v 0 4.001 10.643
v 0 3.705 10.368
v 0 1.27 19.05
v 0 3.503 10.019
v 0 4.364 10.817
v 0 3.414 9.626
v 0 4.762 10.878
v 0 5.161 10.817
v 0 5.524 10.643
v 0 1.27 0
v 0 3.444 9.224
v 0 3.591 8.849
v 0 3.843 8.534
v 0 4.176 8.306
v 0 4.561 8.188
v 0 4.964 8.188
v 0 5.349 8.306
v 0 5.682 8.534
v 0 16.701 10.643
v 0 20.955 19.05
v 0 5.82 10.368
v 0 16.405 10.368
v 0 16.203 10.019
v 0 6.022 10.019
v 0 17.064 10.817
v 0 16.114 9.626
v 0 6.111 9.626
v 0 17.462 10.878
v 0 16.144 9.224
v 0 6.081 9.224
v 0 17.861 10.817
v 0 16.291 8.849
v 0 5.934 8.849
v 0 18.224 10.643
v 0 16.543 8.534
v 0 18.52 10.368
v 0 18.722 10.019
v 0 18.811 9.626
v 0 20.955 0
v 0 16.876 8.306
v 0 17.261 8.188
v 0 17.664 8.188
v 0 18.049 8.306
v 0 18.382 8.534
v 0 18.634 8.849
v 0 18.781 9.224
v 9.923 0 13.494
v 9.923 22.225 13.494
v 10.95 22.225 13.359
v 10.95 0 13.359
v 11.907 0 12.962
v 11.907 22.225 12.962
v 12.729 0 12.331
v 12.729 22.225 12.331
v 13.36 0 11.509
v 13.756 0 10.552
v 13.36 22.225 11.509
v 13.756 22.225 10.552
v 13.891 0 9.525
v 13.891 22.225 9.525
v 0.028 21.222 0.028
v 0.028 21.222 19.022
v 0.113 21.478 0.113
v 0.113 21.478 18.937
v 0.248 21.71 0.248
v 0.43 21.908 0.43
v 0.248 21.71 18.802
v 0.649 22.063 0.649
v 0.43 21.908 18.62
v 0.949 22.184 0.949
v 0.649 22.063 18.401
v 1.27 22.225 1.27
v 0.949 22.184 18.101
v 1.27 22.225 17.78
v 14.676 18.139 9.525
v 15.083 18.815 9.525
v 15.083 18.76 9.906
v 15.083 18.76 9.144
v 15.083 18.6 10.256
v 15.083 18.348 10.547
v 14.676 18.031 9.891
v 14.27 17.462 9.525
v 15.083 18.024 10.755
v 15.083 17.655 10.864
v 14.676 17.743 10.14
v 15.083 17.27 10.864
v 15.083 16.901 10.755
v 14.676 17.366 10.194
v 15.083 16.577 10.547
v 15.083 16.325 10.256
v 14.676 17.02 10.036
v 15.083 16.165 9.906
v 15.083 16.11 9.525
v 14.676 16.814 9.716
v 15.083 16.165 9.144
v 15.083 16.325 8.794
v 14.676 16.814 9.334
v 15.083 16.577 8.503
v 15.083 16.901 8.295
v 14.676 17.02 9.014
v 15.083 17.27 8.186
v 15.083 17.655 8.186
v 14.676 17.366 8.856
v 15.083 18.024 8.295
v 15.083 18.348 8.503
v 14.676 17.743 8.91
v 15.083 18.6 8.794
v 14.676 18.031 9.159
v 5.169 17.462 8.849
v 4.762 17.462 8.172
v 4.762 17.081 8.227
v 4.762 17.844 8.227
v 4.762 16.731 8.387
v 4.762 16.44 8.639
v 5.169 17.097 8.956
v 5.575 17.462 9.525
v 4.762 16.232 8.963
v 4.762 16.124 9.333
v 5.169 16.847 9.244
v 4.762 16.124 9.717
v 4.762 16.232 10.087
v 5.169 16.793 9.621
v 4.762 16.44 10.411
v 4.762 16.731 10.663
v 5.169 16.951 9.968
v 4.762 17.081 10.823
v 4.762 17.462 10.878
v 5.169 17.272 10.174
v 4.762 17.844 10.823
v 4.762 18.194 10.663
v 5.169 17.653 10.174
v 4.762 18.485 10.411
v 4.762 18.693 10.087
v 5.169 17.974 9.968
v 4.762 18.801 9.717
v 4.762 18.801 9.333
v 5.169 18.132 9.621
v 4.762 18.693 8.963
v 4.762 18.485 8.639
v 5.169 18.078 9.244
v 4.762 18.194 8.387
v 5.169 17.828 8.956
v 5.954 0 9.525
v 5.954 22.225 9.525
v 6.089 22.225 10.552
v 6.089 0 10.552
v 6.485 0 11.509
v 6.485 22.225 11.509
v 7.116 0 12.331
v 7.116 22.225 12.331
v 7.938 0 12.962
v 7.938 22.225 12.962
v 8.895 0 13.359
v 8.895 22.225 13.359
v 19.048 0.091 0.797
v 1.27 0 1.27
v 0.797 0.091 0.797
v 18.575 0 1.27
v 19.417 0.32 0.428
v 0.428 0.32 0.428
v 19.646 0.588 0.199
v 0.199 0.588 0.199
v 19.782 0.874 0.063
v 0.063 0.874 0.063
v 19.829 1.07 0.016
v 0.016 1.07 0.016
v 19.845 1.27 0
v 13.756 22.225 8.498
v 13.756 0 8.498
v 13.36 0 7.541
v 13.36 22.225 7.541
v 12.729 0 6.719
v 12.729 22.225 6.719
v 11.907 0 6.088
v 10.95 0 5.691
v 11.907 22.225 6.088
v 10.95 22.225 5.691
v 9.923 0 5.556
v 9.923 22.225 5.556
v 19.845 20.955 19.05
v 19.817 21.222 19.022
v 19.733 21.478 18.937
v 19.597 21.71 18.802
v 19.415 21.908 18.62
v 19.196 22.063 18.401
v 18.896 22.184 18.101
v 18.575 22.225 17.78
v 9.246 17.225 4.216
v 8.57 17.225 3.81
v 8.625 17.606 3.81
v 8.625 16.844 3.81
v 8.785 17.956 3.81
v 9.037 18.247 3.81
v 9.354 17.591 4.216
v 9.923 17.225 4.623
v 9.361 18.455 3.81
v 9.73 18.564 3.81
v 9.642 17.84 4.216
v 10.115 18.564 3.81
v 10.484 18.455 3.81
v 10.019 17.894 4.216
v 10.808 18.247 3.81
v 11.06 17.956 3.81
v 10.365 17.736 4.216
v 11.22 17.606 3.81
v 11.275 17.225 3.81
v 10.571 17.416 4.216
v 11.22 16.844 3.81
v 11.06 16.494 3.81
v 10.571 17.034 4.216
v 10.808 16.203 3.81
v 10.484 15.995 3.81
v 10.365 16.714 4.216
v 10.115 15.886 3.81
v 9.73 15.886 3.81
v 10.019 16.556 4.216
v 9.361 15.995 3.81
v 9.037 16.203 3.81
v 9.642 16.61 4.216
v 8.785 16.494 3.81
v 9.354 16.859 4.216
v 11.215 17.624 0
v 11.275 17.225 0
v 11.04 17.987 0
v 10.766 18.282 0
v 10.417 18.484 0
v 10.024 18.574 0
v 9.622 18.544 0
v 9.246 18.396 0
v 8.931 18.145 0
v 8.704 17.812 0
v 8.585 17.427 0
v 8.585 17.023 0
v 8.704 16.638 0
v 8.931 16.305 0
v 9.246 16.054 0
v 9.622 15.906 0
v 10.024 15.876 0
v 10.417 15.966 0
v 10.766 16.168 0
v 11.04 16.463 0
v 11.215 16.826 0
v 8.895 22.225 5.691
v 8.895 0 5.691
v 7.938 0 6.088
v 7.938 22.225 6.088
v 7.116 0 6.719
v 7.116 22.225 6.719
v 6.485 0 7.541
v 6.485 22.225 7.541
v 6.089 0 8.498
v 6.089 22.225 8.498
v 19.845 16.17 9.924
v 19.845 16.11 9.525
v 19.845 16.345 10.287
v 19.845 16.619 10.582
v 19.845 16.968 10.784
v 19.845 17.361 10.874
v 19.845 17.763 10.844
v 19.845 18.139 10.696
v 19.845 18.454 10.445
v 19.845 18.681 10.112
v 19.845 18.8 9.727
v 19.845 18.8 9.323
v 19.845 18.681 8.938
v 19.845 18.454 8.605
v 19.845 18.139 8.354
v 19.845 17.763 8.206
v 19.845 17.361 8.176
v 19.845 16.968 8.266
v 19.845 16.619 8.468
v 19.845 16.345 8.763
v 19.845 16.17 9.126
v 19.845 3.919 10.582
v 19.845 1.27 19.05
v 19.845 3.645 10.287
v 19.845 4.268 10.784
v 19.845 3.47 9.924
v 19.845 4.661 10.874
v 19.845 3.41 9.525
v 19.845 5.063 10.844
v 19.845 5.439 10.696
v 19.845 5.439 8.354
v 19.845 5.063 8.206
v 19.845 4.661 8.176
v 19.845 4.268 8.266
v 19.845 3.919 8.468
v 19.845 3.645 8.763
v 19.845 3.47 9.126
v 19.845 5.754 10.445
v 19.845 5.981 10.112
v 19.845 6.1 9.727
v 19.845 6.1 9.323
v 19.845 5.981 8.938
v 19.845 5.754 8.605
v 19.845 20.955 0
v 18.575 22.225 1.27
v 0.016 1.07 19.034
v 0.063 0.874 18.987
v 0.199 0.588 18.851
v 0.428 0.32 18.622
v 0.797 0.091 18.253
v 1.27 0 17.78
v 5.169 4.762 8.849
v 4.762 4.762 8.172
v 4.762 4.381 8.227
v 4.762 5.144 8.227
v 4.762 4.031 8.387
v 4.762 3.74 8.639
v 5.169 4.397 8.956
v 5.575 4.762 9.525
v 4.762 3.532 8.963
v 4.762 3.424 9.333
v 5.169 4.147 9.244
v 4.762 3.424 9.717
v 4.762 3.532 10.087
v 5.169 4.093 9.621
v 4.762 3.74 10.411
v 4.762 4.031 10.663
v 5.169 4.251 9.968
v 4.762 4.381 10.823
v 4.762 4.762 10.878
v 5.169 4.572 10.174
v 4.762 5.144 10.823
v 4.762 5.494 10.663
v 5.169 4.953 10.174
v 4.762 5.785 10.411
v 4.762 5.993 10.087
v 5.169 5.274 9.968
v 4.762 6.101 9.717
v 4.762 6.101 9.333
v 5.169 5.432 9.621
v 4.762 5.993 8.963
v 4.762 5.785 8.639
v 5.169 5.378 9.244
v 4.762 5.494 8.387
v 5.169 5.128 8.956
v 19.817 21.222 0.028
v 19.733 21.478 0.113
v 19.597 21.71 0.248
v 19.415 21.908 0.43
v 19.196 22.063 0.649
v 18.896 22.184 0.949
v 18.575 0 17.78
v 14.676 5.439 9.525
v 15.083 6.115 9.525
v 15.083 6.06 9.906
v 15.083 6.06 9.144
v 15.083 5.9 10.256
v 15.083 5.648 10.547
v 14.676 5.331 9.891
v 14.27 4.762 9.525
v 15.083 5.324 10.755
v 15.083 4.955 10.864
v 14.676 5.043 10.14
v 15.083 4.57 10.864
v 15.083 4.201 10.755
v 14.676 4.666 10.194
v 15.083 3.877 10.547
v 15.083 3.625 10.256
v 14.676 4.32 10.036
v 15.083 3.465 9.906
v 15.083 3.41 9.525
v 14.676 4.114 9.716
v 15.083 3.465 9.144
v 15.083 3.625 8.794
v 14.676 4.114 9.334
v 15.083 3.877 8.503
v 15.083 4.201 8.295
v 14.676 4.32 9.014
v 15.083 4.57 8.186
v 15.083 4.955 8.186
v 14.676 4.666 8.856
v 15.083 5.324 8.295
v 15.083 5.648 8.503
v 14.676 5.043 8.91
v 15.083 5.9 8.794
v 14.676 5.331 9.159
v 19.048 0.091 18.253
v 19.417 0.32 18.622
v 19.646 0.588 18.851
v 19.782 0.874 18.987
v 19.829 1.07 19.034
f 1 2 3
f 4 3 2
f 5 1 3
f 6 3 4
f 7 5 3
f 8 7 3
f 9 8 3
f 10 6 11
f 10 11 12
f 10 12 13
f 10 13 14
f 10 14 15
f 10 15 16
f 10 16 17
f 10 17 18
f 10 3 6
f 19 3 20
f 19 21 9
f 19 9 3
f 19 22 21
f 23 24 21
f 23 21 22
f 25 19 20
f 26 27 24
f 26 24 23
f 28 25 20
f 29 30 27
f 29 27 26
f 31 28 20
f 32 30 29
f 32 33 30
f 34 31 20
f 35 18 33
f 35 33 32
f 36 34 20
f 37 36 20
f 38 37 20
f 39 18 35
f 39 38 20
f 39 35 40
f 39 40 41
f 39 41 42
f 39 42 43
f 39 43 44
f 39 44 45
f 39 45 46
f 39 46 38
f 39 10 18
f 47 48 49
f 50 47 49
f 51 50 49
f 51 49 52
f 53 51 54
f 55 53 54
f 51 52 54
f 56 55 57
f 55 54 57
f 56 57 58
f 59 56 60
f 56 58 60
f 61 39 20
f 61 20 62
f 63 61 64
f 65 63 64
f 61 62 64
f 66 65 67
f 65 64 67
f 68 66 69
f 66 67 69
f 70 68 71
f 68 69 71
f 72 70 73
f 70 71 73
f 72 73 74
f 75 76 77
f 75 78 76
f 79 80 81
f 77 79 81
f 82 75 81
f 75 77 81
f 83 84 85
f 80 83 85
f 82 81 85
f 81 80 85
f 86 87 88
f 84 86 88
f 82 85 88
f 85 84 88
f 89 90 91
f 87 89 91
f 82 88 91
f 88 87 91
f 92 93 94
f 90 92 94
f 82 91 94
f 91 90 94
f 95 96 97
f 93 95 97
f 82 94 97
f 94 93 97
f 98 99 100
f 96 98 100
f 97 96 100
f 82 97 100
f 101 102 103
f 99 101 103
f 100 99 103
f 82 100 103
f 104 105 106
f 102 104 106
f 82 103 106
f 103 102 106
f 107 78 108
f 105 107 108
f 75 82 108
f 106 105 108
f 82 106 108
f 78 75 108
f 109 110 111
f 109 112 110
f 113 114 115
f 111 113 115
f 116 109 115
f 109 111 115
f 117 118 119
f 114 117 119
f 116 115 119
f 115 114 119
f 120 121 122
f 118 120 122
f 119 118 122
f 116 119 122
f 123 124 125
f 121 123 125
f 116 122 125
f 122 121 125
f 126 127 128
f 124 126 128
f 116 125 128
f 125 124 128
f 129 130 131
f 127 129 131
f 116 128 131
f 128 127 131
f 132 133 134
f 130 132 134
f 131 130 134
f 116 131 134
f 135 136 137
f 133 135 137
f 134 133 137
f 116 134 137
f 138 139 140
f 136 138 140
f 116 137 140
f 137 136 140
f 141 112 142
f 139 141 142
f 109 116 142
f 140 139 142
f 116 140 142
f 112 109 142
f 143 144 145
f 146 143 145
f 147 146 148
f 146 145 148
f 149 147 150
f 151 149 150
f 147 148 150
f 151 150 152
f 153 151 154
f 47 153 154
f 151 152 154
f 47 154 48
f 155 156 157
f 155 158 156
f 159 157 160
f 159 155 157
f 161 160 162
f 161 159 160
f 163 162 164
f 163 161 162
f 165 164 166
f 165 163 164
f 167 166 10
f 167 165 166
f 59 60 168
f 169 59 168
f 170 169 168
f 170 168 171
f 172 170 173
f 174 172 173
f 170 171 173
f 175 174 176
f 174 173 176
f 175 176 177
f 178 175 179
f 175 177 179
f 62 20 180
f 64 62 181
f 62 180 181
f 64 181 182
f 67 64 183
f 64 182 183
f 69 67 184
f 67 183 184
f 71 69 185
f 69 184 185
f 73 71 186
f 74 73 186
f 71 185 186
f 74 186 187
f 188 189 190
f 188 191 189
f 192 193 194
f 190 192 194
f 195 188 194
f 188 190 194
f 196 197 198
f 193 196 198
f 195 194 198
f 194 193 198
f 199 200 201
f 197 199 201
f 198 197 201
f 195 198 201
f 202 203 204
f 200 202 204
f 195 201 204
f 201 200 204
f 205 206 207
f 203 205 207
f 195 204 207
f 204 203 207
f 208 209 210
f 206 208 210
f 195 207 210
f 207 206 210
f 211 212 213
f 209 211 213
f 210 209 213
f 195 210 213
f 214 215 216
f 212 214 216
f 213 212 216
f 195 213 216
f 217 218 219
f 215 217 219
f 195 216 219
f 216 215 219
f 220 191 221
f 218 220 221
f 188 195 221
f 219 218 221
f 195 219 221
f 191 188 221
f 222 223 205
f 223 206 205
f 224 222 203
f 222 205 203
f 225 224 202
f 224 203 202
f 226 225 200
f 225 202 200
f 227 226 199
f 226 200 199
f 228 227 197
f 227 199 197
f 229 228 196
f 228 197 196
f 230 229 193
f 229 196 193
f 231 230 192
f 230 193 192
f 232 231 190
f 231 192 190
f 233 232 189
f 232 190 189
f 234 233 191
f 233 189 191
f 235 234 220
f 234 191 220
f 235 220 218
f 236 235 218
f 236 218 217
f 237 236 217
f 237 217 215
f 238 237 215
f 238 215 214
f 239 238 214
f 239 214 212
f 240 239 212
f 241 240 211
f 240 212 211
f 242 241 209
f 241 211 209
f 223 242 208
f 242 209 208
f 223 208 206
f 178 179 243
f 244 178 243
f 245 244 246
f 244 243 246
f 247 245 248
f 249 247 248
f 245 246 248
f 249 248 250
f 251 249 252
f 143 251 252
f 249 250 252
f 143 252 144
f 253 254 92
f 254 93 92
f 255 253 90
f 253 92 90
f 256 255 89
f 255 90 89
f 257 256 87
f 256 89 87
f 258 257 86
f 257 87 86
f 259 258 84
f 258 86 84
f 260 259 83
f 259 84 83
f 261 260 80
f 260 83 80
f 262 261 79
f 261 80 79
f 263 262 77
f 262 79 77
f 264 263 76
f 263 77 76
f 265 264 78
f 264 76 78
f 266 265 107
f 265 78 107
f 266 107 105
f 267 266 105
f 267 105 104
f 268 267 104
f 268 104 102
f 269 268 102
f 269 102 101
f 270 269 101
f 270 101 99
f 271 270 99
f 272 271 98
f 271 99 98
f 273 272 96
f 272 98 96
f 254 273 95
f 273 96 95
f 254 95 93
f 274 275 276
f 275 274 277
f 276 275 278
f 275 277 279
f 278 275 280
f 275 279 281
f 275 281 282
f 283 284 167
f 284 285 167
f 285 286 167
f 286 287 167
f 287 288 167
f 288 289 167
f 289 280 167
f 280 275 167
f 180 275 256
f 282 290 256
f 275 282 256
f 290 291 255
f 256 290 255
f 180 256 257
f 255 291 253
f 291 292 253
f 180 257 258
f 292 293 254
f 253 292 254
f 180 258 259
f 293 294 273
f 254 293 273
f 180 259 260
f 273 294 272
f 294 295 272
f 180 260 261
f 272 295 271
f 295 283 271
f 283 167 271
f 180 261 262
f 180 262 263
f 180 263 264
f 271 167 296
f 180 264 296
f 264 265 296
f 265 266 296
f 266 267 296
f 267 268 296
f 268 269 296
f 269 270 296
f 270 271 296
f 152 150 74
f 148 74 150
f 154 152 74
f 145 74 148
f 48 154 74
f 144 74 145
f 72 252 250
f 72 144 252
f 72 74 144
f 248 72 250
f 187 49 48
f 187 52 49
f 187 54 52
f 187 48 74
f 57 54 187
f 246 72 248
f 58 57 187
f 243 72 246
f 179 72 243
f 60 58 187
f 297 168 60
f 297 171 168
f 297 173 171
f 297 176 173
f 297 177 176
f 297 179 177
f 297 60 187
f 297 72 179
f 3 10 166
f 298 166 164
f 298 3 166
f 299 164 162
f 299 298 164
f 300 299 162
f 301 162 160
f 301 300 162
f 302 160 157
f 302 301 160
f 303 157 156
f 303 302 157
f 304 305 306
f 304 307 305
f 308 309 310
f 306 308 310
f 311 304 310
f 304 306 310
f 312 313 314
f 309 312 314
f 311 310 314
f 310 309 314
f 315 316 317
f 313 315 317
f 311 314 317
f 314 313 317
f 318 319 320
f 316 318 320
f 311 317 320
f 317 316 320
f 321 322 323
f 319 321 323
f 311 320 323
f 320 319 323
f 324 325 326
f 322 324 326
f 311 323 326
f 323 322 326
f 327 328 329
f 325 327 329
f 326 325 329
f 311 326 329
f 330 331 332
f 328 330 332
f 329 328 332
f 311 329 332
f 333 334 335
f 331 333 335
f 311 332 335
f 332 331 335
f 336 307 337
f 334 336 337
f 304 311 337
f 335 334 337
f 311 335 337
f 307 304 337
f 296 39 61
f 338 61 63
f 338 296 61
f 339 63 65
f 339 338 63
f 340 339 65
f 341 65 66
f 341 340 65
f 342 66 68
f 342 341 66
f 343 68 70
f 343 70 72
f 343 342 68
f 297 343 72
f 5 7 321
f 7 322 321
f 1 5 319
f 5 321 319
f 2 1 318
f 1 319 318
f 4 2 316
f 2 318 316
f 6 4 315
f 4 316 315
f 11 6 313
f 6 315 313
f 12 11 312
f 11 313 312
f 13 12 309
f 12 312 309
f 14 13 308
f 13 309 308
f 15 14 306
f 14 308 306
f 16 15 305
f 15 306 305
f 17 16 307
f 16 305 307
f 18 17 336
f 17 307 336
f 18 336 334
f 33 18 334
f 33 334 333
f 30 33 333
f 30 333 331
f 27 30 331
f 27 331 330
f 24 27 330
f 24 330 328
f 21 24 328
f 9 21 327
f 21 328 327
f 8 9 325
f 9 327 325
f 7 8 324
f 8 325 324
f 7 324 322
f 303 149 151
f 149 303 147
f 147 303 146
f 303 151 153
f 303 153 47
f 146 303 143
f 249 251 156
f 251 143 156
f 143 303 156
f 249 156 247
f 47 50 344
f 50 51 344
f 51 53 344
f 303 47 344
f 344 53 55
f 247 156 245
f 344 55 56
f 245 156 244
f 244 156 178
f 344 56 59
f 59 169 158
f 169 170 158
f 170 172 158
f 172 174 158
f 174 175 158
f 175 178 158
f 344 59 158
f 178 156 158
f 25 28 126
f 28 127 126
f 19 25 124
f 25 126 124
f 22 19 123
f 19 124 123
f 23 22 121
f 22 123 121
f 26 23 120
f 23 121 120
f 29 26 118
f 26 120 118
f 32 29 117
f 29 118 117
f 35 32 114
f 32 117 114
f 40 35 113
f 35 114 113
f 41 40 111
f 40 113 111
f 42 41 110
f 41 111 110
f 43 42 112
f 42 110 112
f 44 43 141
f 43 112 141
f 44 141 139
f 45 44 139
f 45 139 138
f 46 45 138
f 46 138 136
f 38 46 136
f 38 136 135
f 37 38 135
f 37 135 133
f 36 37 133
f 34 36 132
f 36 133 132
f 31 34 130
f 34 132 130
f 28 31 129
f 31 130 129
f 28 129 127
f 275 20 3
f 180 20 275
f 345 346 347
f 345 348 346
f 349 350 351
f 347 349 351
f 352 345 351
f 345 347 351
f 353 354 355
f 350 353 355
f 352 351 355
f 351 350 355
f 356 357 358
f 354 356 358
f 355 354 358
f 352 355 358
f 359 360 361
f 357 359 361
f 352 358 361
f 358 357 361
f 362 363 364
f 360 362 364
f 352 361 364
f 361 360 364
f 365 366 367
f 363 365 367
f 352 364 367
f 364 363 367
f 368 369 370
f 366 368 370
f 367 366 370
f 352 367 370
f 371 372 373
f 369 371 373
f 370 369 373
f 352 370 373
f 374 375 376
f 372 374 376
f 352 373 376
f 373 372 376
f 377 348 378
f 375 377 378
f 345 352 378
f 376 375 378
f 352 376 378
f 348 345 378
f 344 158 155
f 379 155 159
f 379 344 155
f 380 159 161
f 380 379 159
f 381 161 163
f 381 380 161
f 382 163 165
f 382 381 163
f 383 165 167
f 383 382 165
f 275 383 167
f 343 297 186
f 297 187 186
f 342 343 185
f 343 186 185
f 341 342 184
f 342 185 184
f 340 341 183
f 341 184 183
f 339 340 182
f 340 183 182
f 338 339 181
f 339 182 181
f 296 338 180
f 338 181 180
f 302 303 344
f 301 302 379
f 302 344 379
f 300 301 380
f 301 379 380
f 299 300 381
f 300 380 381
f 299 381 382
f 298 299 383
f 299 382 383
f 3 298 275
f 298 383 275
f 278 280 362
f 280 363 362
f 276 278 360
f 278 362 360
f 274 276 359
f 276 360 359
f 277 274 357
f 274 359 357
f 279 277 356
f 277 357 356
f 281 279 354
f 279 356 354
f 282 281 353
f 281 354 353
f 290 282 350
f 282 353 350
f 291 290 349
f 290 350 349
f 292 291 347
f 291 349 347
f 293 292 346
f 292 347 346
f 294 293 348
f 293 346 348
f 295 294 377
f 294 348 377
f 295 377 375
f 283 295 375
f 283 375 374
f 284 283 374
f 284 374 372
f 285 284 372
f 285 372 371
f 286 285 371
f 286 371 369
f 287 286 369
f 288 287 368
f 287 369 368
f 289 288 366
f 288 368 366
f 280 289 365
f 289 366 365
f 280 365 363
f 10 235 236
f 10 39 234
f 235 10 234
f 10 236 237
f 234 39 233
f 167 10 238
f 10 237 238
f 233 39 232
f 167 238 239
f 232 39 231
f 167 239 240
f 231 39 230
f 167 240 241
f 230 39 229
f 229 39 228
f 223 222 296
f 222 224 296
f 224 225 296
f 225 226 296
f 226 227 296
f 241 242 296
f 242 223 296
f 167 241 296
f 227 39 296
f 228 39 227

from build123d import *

# Parameters (mm, degrees)
SKETCH1_W                 = 19.84502
SKETCH1_H                 = 22.225
BODY_DEPTH                = 19.05
YAW_AXLE_OPENING_DEPTH    = 36.364925333
F_6_32_TAPPED_HOLE1_D     = 2.7051
F_6_32_TAPPED_HOLE1_DEPTH = 4.7625
F_6_32_TAPPED_HOLE1_TIP   = 0.81269403
F_6_32_TAPPED_HOLE2_D     = 2.7051
F_6_32_TAPPED_HOLE2_DEPTH = 4.7625
F_6_32_TAPPED_HOLE2_TIP   = 0.81269403
F_6_32_TAPPED_HOLE3_D     = 2.7051
F_6_32_TAPPED_HOLE3_DEPTH = 3.81
F_6_32_TAPPED_HOLE3_TIP   = 0.81269403
FILLET1_R                 = 1.27


with BuildPart() as part:
    # Sketch1 → Body (new body)
    with BuildSketch(Plane.XY):
        with Locations((9.92251, 11.1125)):
            Rectangle(SKETCH1_W, SKETCH1_H)
    extrude(amount=BODY_DEPTH)

    # Sketch2 → Yaw Axle Opening (cut, through all)
    with BuildSketch(Plane(origin=(0, 22.225, 0), x_dir=(1, 0, 0), z_dir=(0, 1, 0))):
        with BuildLine():
            ThreePointArc((13.89126, -9.525), (12.728840038, -6.718669962), (9.92251, -5.55625))
            Line((9.92251, -5.55625), (9.92251, -9.525))
            Line((9.92251, -9.525), (13.89126, -9.525))
        make_face()
        with BuildLine():
            Line((9.92251, -9.525), (9.92251, -5.55625))
            ThreePointArc((9.92251, -5.55625), (7.116179962, -6.718669962), (5.95376, -9.525))
            Line((5.95376, -9.525), (9.92251, -9.525))
        make_face()
        with BuildLine():
            Line((13.89126, -9.525), (9.92251, -9.525))
            Line((9.92251, -9.525), (9.92251, -13.49375))
            ThreePointArc((9.92251, -13.49375), (12.728840038, -12.331330038), (13.89126, -9.525))
        make_face()
        with BuildLine():
            Line((9.92251, -13.49375), (9.92251, -9.525))
            Line((9.92251, -9.525), (5.95376, -9.525))
            ThreePointArc((5.95376, -9.525), (7.116179962, -12.331330038), (9.92251, -13.49375))
        make_face()
    extrude(amount=-YAW_AXLE_OPENING_DEPTH, mode=Mode.SUBTRACT)

    # #6-32 Tapped Hole1
    with Locations(Plane(origin=(0, 17.4625, 9.525), x_dir=(0, 0, -1), z_dir=(-1, 0, 0))):
        with Locations((0, 0), (0, 12.7)):
            Hole(F_6_32_TAPPED_HOLE1_D / 2, depth=F_6_32_TAPPED_HOLE1_DEPTH)
            with Locations((0, 0, -(F_6_32_TAPPED_HOLE1_DEPTH + F_6_32_TAPPED_HOLE1_TIP / 2))):  # 118° drill point
                Cone(0, F_6_32_TAPPED_HOLE1_D / 2, F_6_32_TAPPED_HOLE1_TIP, mode=Mode.SUBTRACT)

    # #6-32 Tapped Hole2
    with Locations(Plane(origin=(19.84502, 17.4625, 9.525), x_dir=(0, 1, 0), z_dir=(1, 0, 0))):
        with Locations((0, 0), (-12.7, 0)):
            Hole(F_6_32_TAPPED_HOLE2_D / 2, depth=F_6_32_TAPPED_HOLE2_DEPTH)
            with Locations((0, 0, -(F_6_32_TAPPED_HOLE2_DEPTH + F_6_32_TAPPED_HOLE2_TIP / 2))):  # 118° drill point
                Cone(0, F_6_32_TAPPED_HOLE2_D / 2, F_6_32_TAPPED_HOLE2_TIP, mode=Mode.SUBTRACT)

    # #6-32 Tapped Hole3
    with Locations(Plane(origin=(0, 0, 0), x_dir=(-1, 0, 0), z_dir=(0, 0, -1))):
        with Locations((-9.92251, 17.225)):
            Hole(F_6_32_TAPPED_HOLE3_D / 2, depth=F_6_32_TAPPED_HOLE3_DEPTH)
            with Locations((0, 0, -(F_6_32_TAPPED_HOLE3_DEPTH + F_6_32_TAPPED_HOLE3_TIP / 2))):  # 118° drill point
                Cone(0, F_6_32_TAPPED_HOLE3_D / 2, F_6_32_TAPPED_HOLE3_TIP, mode=Mode.SUBTRACT)

    # Fillet1
    fillet1_edges = [part.edges().sort_by_distance(p)[0] for p in [
        (9.92251, 22.225, 19.05),
        (9.92251, 22.225, 0),
        (9.92251, 0, 0),
        (9.92251, 0, 19.05),
        (0, 22.225, 9.525),
        (19.84502, 22.225, 9.525),
        (19.84502, 0, 9.525),
        (0, 0, 9.525),
    ]]
    fillet(fillet1_edges, radius=FILLET1_R)


solid = part.part
